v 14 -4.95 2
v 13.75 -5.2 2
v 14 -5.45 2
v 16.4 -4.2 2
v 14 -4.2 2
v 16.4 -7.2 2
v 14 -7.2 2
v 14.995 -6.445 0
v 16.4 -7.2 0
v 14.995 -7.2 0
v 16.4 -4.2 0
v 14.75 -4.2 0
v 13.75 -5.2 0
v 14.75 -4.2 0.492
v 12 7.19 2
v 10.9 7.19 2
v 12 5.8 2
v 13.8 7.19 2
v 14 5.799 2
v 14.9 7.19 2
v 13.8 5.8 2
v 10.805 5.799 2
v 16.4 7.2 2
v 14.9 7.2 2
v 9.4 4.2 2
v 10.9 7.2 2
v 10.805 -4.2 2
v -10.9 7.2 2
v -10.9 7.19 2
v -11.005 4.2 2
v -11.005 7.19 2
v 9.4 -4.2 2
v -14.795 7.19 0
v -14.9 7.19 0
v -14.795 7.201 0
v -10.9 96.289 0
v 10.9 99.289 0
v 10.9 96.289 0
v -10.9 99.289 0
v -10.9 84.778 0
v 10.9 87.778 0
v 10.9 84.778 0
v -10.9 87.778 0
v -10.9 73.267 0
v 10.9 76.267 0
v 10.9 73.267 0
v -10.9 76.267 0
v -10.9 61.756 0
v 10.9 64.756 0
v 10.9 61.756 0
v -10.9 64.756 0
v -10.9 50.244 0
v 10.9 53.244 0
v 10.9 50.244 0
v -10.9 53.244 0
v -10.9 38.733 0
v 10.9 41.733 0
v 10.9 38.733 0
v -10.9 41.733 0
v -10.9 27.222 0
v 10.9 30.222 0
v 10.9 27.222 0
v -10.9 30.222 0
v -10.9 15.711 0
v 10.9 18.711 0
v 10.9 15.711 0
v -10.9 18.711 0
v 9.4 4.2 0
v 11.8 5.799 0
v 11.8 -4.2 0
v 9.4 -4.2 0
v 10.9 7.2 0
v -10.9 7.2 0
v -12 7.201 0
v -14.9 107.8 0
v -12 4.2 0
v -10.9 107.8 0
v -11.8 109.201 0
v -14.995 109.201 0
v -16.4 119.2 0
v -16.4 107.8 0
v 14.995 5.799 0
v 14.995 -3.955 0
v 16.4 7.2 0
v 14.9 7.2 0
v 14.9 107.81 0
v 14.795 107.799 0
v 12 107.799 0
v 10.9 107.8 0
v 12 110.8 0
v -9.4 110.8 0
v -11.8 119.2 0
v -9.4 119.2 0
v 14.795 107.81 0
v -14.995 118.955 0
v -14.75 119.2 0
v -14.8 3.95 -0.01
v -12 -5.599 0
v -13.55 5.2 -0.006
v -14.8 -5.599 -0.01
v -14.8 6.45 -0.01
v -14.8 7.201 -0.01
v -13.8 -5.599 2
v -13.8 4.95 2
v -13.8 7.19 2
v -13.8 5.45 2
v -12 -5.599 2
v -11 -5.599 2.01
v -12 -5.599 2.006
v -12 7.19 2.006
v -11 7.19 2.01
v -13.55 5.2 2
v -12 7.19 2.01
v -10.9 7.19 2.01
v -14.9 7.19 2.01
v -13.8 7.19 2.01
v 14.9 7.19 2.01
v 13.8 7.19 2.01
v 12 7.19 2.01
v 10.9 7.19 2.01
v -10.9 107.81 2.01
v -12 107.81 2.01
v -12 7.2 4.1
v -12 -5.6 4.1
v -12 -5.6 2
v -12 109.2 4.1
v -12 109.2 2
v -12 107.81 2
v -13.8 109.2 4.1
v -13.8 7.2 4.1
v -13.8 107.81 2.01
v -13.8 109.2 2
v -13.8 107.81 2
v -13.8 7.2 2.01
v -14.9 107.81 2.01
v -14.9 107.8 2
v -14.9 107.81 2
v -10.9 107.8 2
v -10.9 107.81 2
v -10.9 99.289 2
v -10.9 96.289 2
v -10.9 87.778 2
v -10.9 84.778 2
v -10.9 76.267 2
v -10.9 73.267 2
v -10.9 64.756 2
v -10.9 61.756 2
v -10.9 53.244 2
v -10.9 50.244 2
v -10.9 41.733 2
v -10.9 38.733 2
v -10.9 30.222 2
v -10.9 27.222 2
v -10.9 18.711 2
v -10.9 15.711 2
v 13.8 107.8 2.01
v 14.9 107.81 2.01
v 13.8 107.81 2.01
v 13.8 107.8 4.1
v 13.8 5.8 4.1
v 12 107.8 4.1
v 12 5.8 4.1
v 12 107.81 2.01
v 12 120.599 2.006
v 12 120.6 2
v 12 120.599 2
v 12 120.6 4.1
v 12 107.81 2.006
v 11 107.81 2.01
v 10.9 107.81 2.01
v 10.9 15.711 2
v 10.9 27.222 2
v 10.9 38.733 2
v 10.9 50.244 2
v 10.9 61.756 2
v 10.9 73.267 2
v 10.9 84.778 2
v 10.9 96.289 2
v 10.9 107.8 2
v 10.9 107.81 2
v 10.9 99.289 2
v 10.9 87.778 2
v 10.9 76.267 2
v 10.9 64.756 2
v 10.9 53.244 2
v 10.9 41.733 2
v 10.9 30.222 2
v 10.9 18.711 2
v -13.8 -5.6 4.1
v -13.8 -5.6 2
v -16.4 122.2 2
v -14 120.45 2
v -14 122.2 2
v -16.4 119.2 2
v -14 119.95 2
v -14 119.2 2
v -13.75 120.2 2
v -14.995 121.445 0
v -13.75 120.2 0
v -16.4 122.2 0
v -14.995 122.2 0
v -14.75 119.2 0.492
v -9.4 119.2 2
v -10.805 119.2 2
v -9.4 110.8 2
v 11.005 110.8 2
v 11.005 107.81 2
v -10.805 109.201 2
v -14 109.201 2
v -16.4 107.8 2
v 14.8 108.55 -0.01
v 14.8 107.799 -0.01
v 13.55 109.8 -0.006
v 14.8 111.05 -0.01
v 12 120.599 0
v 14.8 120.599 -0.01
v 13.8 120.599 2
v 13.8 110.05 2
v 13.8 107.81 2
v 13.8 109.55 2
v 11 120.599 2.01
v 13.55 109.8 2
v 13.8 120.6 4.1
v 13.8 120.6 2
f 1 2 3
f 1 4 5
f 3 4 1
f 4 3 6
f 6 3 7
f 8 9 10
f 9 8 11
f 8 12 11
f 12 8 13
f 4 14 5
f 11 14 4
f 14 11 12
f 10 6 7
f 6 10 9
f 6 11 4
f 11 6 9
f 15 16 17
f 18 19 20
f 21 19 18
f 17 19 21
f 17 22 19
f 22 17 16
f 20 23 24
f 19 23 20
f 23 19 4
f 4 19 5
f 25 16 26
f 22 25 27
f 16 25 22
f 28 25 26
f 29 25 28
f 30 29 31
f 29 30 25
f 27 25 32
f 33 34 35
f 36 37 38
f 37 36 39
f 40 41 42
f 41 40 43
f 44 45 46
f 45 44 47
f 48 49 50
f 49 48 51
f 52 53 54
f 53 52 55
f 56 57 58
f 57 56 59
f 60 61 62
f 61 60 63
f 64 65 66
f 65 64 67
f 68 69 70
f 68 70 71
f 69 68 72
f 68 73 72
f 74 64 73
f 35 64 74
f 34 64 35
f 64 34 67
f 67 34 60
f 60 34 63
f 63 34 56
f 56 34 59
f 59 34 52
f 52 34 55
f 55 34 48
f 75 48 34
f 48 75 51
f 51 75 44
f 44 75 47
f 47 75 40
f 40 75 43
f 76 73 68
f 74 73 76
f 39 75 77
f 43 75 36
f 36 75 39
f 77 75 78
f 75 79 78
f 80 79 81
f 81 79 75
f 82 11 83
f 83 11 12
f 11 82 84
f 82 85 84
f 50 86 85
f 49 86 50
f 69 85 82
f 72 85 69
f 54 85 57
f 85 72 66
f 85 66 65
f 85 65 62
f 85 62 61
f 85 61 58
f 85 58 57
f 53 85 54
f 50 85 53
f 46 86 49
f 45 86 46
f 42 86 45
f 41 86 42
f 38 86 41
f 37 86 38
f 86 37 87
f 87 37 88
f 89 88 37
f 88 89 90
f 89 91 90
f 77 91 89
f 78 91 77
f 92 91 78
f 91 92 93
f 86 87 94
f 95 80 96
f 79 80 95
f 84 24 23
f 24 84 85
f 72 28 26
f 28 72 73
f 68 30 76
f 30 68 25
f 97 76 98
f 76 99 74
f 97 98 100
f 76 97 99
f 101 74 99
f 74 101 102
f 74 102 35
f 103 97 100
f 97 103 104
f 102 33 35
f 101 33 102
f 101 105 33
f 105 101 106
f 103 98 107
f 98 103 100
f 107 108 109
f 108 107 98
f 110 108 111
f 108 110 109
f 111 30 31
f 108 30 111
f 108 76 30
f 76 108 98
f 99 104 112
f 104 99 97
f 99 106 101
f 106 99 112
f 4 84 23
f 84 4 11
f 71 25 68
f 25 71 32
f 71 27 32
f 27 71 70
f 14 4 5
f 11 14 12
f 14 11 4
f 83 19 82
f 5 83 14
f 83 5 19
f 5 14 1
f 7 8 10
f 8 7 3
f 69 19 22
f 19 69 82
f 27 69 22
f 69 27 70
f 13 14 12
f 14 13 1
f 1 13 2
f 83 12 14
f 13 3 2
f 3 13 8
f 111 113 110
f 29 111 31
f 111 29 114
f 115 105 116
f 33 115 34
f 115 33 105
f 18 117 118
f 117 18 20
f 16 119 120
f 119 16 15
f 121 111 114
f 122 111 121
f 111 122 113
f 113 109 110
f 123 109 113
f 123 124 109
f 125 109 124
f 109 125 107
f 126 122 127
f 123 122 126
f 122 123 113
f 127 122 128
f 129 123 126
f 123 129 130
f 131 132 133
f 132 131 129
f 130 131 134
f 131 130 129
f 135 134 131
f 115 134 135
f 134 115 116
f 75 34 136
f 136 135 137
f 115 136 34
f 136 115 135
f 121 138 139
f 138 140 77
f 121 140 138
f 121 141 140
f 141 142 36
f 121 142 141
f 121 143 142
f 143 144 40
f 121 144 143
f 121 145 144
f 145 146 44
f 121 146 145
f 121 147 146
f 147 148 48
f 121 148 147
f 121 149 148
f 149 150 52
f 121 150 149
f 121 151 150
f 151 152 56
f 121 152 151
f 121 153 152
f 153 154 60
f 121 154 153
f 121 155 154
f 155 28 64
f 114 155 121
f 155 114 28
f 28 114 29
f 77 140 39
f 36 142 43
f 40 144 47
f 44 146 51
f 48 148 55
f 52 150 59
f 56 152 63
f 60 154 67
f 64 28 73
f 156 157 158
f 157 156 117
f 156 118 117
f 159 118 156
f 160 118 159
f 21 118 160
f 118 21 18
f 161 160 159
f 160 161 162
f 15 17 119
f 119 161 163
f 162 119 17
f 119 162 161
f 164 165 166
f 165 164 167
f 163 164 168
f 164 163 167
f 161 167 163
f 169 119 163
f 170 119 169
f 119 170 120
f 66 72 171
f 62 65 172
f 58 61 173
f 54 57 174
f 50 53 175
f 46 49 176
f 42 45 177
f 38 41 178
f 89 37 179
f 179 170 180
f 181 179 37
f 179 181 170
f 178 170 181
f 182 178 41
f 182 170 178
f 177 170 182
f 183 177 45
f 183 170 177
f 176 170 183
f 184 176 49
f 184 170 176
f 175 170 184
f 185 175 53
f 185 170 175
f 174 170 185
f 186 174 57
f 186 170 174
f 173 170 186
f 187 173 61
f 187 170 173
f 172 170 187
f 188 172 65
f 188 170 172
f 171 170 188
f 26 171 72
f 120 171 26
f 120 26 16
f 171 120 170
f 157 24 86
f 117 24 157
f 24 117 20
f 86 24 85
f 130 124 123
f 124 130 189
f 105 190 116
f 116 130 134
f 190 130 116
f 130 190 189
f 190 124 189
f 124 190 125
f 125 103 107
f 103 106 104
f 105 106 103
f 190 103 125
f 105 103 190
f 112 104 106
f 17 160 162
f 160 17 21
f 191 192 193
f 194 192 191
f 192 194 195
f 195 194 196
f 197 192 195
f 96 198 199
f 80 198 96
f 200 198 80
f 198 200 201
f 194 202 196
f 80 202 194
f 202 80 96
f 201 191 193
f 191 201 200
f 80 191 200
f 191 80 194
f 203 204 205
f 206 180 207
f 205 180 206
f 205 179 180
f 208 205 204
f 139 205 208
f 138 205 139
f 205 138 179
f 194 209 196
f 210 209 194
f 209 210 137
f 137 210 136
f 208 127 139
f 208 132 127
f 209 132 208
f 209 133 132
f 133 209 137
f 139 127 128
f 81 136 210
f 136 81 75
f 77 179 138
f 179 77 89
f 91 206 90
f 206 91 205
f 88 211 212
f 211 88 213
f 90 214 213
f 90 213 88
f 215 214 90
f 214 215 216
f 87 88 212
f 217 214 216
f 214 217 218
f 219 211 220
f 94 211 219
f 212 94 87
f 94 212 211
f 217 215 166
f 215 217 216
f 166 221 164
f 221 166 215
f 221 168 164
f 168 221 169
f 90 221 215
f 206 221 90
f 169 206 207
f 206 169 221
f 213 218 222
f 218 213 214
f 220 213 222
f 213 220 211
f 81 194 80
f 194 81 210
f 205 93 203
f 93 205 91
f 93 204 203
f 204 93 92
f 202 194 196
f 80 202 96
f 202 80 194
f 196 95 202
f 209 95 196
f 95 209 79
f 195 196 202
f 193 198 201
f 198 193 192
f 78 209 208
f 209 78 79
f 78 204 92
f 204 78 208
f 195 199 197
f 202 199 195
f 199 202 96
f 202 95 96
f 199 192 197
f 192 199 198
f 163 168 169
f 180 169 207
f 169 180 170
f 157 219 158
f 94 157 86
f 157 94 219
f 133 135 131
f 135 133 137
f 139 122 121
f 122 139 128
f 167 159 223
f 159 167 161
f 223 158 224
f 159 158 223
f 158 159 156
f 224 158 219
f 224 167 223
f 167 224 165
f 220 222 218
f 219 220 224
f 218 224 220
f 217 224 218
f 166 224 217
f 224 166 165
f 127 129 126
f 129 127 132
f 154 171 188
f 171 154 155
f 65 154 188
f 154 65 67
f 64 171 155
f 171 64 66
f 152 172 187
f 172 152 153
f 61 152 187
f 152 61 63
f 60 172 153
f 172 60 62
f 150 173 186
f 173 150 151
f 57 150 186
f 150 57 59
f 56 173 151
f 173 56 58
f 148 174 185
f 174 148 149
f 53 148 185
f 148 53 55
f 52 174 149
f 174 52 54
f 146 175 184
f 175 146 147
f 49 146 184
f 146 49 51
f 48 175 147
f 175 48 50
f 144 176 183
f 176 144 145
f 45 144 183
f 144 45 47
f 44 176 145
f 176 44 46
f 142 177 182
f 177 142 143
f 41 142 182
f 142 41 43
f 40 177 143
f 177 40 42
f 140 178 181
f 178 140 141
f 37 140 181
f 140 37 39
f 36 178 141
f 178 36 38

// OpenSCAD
//================ main ================

// 1. just a joint base
// drawJointBase();

// 2. sample on how joints fit together
// TODO rail(); translate([0,-4.3,0]) rotate([0,0,180]) rail();

// Roco R2 curve left, 15 degrees
//drawCurve(358, 15);
//drawCurveRocoR(2, 15);
//color("blue")
//translate([-23/2,0,0])
//cube([23,13,4]);
// Roco G1/2 115mm
//scale(1.4)
drawStraightG(1/2);
//drawJointX();

//drawCurve(358, 15);
//translate([0,-115,0])
//drawStraightG(1/2);

//====================== API ======================
// Track starts and ends with joint.
// Joint takes 2 ties and is always the same (straight).
// By default all draw* methods traw track in Y-axis starting from origin.
//
//    Y->         JTTTTTTTTTT
//  X             J   T   T
//  |           0 J   T   T
//  V             J   T   T
//             JJJJTTTTTTTTTT

/// One half of joint (base, no tracks).
module drawJointBase() {translate([0, TIE_SPACING/2]) whole_joint_base();};

/// One half of whole joint (base + tracks).
/// Error margin added.
module drawJointX() {translate([0, TIE_SPACING/2]) whole_joint();};

/// Tie, center of tie is in the origin
module drawTie() {
    translate([0, -TIE_WIDTH/2]) tie();
}


//- R2 -> 358mm radius (12pc., 30º each)
//- R3 -> 419,6mm " " "
//- R4 -> 481,2mm " " "
//- R5 -> 542,8mm " " "
//- R6 -> 604,4mm " " "
//- R9 -> 826,4mm " (24pc., 15º each)????
module drawCurveRocoR(R, Angle) {curve(358+61.6*(R-2), Angle);}


/// Radius - millimeters (measured to the centre of the track)
/// Angle - degrees
/// Seems as left curve, but you know, look from another side,
/// and it is right curve ;)
module drawCurve(Radius, Angle) {curve(Radius, Angle);}

/// G4 920mm
/// G1 230mm
/// G1/2 115mm
/// G1/4 57,5mm
module drawStraightG(G) {straightG(G);}

//================= configuration ===================

GAUGE = 24;

DDD = 0.1;

LEN_STEPS = 3; // <<<

TRACK_WIDTH = 1.8;
TRACK_HEIGHT = 2.1;

TRACK_BASE_WIDTH = 4;
TRACK_BASE_JOINT_EXTRA_WIDTH = (7-TRACK_BASE_WIDTH) / 2;

TIE_LENGTH = 28;
TIE_WIDTH = 3;
TIE_HEIGHT = 2;
TIE_SPACING = 8.4; // TODO

JOINT_LENGTH = TIE_SPACING + TIE_WIDTH / 2; // TODO?
JOINT_WIDTH = 3; // TODO
JOINT_RAIL_ANGLE = 30;
JOINT_SIZE = 2;

_JOINT_EFFECTIVE_LENGTH = TIE_WIDTH + TIE_SPACING / 2;
_TIE_STEP = TIE_WIDTH + TIE_SPACING;
_TIE_DX = TIE_LENGTH / 2;
_TRACK_BASE_DX = GAUGE / 2 - (TRACK_BASE_WIDTH - TRACK_WIDTH) / 2;
_TRACK_BASE_X_CENTRE = -_TRACK_BASE_DX-TRACK_BASE_WIDTH/2;
_TRACK_TOTAL_HEIGHT = TRACK_HEIGHT + TIE_HEIGHT;

RENDERING_ERROR = 0.01;
XXX_HEAD_WIDTH = 0.4;

module rail() { // TODO deprecated
    union() {
        whole_joint_base();
        for (i = [1:LEN_STEPS]) {
            translate([0,i*_TIE_STEP]) tie_with_base();
        }
        // left track
        translate([-TRACK_WIDTH-GAUGE/2-DDD,
                   -JOINT_LENGTH+DDD,
                   TIE_HEIGHT])
            cube([TRACK_WIDTH,
                  LEN_STEPS*_TIE_STEP+JOINT_LENGTH+TIE_WIDTH-DDD,
                  TRACK_HEIGHT]);
        // right track
        translate([GAUGE/2+DDD,
                   JOINT_LENGTH - TIE_SPACING + DDD,
                   TIE_HEIGHT])
            cube([TRACK_WIDTH,
                  LEN_STEPS*_TIE_STEP + JOINT_LENGTH - TIE_SPACING - DDD,
                  TRACK_HEIGHT]);
    }
}

// straight with end-points
module straightG(G) {
    _length = 230 * G;
    _plain_length = _length - 2*_JOINT_EFFECTIVE_LENGTH;
    union() {
        // starting joint
        drawJointX();
        // ending joint
        translate([0, _length])
            rotate(180)
                drawJointX();
        // the rest of the track
        translate([0, _JOINT_EFFECTIVE_LENGTH])
            plainStraight(_plain_length);
    }
}

// straight with tie spaces at the end
// length in mm
module plainStraight(length) {
    _tie_count = round ( (length + TIE_WIDTH) / _TIE_STEP) - 1;
    _tie_spacing = (length - _tie_count*TIE_WIDTH) / (_tie_count+1);
    union() {
        // track
        translate([0,length])
        rotate(90, [1, 0, 0])
            linear_extrude(length)
                trackPlusBaseProfile();
        // ties
        for (i = [1:_tie_count]) {
            _start_length = (i * (TIE_WIDTH+_tie_spacing) - TIE_WIDTH/2);
            translate([0, _start_length])
                drawTie();
        }
    }
}

// curve with end-joints
// joints themselves are straight, so for joint-free part we
// need to have tighter radius
//  TODO draw that romb with height = _JOINT_EFFECTIVE_LENGTH
module curve(Radius, Angle) {
    // TODO works for left (Radius positive)
    _DR = _JOINT_EFFECTIVE_LENGTH / tan(Angle/2);
    _Radius = Radius - _DR;
    union() {
        // starting joint
        drawJointX();
        // ending joint
        translate([-Radius, 0])
            rotate(Angle)
                translate([Radius, 0])
                    rotate(180)
                        drawJointX();
        translate([0, _JOINT_EFFECTIVE_LENGTH])
            plainCurve(_Radius, Angle);
    }
}

// Curve starts and ends with tie spacing
module plainCurve(Radius, Angle) {
    _length = Angle * PI / 180 * Radius;
    echo (_length);
    _tie_count = round ( (_length + TIE_WIDTH) / _TIE_STEP) - 1;
    _tie_spacing = (_length - _tie_count*TIE_WIDTH) / (_tie_count+1);
    union() {
        // track base + track
        translate([-Radius, 0])
            rotate_extrude(angle = Angle, $fn = 200) // TODO $fn
                translate([Radius, 0])
                    trackPlusBaseProfile();
        // ties
        for (i = [1:_tie_count]) {
            _start_length = (i * (TIE_WIDTH+_tie_spacing) - TIE_WIDTH/2);
            translate([-Radius, 0])
                rotate(_start_length / _length * Angle)
                    translate([Radius, 0])
                        drawTie();
        }
    }
}

module trackPlusBaseProfile() {
    union() {
        trackProfile();
        trackBaseProfile();
    }
}

module trackBaseProfile() {
    union() {
        // left profile
        translate([-TRACK_BASE_WIDTH-_TRACK_BASE_DX,0])
            square([TRACK_BASE_WIDTH,
                    TIE_HEIGHT + RENDERING_ERROR]);
        // right profile
        translate([_TRACK_BASE_DX,0])
            square([TRACK_BASE_WIDTH,
                    TIE_HEIGHT + RENDERING_ERROR]);
    }
}

module trackProfile() {
    union() {
        // left profile
        leftTrackProfile();
        // right profile
        rightTrackProfile();
    }
}

module leftTrackProfile() {
    translate([-TRACK_WIDTH-GAUGE/2,TIE_HEIGHT])
        square([TRACK_WIDTH, TRACK_HEIGHT]);
}

module rightTrackProfile() {
    mirror()
        leftTrackProfile();
}

/////////////////////////////////////////

module tie_with_base() {
    union() {
        tie();
        translate([_TRACK_BASE_DX, -TIE_SPACING, 0]) {
            cube([TRACK_BASE_WIDTH, TIE_SPACING, TIE_HEIGHT]);
        }
        translate([-_TRACK_BASE_DX-TRACK_BASE_WIDTH, -TIE_SPACING, 0]) {
            cube([TRACK_BASE_WIDTH, TIE_SPACING, TIE_HEIGHT]);
        }
    }
}

module tie() {
    translate([-_TIE_DX, 0, 0]) {
        cube([TIE_LENGTH, TIE_WIDTH, TIE_HEIGHT]);
    }
}

module tie_half() { // TODO
    cube([TIE_LENGTH / 2, TIE_WIDTH, TIE_HEIGHT]);
}

module base_joint(dx) {
    __JOINT_INDENT = sin(JOINT_RAIL_ANGLE) * TIE_HEIGHT / 2;
    difference() {
        ///
        translate([0,0.001,0])
        rotate(90, [1, 0, 0])
        linear_extrude(height = JOINT_LENGTH + TIE_WIDTH + dx)
            polygon(points =
                [[-JOINT_WIDTH/2 - __JOINT_INDENT - dx, 0-0.01],
                 [JOINT_WIDTH/2 - __JOINT_INDENT  + dx, 0],
                 [JOINT_WIDTH/2 + __JOINT_INDENT  + dx, TIE_HEIGHT+0.01],
                 [-JOINT_WIDTH/2 + __JOINT_INDENT - dx, TIE_HEIGHT]]
        );
        // xxx
//        translate([-2-dx,-2,0])
//            rotate(45, [0,0,1])
//                translate([-JOINT_SIZE/2,-JOINT_SIZE/2,-0.01])
//                    cube([JOINT_SIZE,JOINT_SIZE,TIE_HEIGHT+0.02]);
        // TODO first is depth, second is distance along rail "axis"
        translate([-0.75-dx,-2,-0.01])
                rotate(135, [0,0,1])
                    cube([5,5,TIE_HEIGHT+0.02]);
    }
}

// starting from tie edge
module whole_joint() {
    _left_track_length = JOINT_LENGTH+TIE_WIDTH-DDD;
    _right_track_length = _TIE_STEP-JOINT_LENGTH-DDD;
    union() {
        // joint base
        whole_joint_base();
        // rendering error
        translate([0, TIE_WIDTH+RENDERING_ERROR])
            rotate([90])
                linear_extrude(2*RENDERING_ERROR)
                    trackPlusBaseProfile();
        // left track
        translate([0, TIE_WIDTH])
            rotate([90])
                linear_extrude(_left_track_length)
                    leftTrackProfile();
        // right track
        translate([0, TIE_WIDTH])
            rotate([90])
                linear_extrude(_right_track_length)
                    rightTrackProfile();
    }
}

module whole_joint_base()
{
    difference(){
    union() {
        // very first TIE in joint (small bit)
        translate([0, -_TIE_STEP]) {
            intersection() {
                union() {
                    tie();
                    translate([_TRACK_BASE_DX, 0, 0]) {
                        cube([TRACK_BASE_WIDTH + TRACK_BASE_JOINT_EXTRA_WIDTH, TIE_WIDTH, TIE_HEIGHT]);
                    }
                }
                translate([_TRACK_BASE_DX + TRACK_BASE_WIDTH/2, 0, 0]){
                    cube(TIE_LENGTH, TIE_WIDTH, TIE_HEIGHT);
                };
            }
        };
        // second TIE in joint (bigger bit)
        intersection() {
            tie();
            translate([-(GAUGE/2+TRACK_BASE_WIDTH/5), 0, 0]){
                cube(TIE_LENGTH, TIE_WIDTH, TIE_HEIGHT);
            }
        }
        // joint base sample
        // TODO DDD
        translate([_TRACK_BASE_DX - TRACK_BASE_JOINT_EXTRA_WIDTH, -TIE_SPACING, 0]) {
            cube([TRACK_BASE_WIDTH + 2*TRACK_BASE_JOINT_EXTRA_WIDTH, _TIE_STEP, TIE_HEIGHT]);
        }
        // joint
        translate([_TRACK_BASE_X_CENTRE, TIE_WIDTH]) {
            base_joint(-DDD); // a bit smaller
        }
        // antiwrap
/*        translate([-_TRACK_BASE_DX-TRACK_BASE_WIDTH/2, -_JOINT_EFFECTIVE_LENGTH])
            antiwarp();
        translate([_TRACK_BASE_DX+TRACK_BASE_WIDTH, -_JOINT_EFFECTIVE_LENGTH])
            antiwarp();
*/
    };
        // anti-joint
        translate([-_TRACK_BASE_X_CENTRE, -_TIE_STEP]) {
            //translate([-0.005, 0, -0.001]) scale(1.01)
                rotate(180, [0, 0, 1]) base_joint(DDD); // a bit larger
        };
    }
}

/////
module antiwarp() {
    _length = 5;
    _r = 10; // track dir
    _rx = 15;
    union() {
        translate([-XXX_HEAD_WIDTH/2, -_length-_r])
            cube([XXX_HEAD_WIDTH+0.1, _length+RENDERING_ERROR+_r, TIE_HEIGHT/2]);
        translate([0, -_length-_r]) scale([_rx/_r,1])
            cylinder(TIE_HEIGHT/2,_r,_r);
    }
}
